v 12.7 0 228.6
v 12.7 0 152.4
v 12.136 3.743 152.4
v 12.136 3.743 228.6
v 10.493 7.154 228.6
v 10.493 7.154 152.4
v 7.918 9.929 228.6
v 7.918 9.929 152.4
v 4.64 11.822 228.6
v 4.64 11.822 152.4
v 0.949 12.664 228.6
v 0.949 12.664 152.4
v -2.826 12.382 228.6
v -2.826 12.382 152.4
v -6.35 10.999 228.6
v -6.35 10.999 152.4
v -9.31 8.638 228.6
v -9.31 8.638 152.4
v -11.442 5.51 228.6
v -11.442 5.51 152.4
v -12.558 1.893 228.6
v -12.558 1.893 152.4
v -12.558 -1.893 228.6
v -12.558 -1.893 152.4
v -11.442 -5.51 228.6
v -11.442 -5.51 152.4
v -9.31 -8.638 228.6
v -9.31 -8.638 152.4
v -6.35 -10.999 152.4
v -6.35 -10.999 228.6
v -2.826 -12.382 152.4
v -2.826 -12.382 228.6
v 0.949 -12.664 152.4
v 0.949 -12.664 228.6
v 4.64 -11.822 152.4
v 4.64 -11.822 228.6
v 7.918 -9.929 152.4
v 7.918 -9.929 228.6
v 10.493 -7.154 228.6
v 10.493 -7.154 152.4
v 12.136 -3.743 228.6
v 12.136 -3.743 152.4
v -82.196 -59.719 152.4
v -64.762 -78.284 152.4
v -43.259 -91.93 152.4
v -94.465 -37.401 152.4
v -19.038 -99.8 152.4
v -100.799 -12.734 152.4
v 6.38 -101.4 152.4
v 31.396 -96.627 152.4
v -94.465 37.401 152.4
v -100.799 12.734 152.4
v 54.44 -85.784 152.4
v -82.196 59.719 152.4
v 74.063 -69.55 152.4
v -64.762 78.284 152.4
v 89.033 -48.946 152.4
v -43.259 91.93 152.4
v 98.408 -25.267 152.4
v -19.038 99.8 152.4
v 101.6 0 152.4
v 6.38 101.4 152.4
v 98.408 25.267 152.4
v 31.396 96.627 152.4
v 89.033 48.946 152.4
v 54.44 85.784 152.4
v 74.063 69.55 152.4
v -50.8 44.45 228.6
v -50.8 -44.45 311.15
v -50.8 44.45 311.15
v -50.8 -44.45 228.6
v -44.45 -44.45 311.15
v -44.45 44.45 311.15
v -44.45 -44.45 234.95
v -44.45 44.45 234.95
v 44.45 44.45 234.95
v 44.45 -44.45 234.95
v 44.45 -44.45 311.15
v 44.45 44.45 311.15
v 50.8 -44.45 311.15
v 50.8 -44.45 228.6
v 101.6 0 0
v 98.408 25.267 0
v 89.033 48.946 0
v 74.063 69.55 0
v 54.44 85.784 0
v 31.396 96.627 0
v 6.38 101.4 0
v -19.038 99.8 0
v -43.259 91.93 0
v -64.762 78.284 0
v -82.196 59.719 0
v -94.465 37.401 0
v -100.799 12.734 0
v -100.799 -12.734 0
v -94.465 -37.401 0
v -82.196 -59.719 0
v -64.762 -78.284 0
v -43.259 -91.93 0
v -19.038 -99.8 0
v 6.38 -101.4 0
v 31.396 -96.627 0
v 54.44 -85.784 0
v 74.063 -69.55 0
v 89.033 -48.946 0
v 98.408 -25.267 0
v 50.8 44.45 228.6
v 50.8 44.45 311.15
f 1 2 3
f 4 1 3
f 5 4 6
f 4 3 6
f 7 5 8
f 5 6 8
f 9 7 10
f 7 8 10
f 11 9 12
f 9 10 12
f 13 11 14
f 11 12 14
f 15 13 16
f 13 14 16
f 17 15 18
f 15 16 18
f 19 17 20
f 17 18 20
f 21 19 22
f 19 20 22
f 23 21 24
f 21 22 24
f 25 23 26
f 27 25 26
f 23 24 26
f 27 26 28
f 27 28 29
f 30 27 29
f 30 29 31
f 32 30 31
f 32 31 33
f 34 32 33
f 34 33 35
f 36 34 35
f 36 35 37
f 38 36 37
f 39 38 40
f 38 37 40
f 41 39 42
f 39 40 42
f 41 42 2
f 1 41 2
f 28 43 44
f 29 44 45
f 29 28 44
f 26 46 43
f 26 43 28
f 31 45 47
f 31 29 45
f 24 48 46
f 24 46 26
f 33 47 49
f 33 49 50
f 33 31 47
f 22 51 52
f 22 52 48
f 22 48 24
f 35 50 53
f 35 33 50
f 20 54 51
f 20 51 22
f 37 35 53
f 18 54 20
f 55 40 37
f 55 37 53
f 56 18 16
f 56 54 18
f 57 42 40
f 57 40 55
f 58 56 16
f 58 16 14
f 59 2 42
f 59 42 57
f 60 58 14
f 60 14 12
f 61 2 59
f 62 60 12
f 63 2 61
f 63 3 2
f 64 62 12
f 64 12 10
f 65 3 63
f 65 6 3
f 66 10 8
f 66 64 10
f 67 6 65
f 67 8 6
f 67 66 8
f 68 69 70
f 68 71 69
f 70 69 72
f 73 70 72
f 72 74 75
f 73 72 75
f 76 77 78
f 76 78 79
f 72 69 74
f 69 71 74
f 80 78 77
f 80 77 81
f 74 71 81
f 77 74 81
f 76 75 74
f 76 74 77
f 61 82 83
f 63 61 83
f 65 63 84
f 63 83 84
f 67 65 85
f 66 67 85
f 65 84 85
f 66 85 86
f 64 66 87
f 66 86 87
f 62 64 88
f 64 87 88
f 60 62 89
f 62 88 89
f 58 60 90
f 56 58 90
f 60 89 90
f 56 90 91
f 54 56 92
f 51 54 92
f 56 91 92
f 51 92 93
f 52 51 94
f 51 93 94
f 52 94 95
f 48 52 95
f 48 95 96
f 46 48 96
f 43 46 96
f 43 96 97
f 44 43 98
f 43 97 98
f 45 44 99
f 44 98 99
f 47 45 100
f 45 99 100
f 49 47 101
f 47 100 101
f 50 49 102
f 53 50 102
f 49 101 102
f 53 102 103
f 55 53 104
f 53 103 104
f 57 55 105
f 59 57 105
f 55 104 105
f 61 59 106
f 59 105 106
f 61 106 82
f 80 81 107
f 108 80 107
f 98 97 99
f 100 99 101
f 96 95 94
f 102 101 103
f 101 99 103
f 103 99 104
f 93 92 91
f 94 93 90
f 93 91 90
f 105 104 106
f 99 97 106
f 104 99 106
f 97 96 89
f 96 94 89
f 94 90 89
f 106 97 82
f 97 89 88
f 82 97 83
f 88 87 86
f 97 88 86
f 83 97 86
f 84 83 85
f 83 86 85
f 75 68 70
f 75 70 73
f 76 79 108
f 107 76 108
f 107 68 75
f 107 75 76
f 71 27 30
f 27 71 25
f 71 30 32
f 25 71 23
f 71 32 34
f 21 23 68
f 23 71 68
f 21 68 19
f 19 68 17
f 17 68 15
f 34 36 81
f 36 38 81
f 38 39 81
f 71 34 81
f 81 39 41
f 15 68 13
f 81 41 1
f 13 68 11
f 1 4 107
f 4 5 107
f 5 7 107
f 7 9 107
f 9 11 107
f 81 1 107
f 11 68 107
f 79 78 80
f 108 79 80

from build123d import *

# Parameters (mm, degrees)
F0_R     = 101.6
F1_DEPTH = 152.4
F2_R     = 12.7
F3_DEPTH = 76.2
F4_W     = 101.6
F4_H     = 88.9
F4_R     = 12.7
F5_DEPTH = 6.35
F6_W     = 6.35
F6_H     = 88.9
F7_DEPTH = 76.2


# Not quite as in the source:
# - a feature names something its author has since deleted; it is built from what else it names


with BuildPart() as f1:
    # F0 (on Top) → F1 (new body)
    with BuildSketch(Plane.XY):
        Circle(F0_R)
    extrude(amount=F1_DEPTH)

    # F2 (on face) → F3 (join)
    with BuildSketch(Plane.XY.offset(152.4)):
        Circle(F2_R)
    extrude(amount=F3_DEPTH)

    # F4 (on face) → F5 (join)
    with BuildSketch(Plane.XY.offset(228.6)):
        Rectangle(F4_W, F4_H)
        Circle(F4_R, mode=Mode.SUBTRACT)
        Circle(F4_R)
    extrude(amount=F5_DEPTH)

    # F6 (on face) → F7 (join)
    with BuildSketch(Plane.XY.offset(234.95)):
        with Locations((-47.625, 0)):
            Rectangle(F6_W, F6_H)
        with Locations((47.625, 0)):
            Rectangle(F6_W, F6_H)
    extrude(amount=F7_DEPTH)


solid = f1.part
